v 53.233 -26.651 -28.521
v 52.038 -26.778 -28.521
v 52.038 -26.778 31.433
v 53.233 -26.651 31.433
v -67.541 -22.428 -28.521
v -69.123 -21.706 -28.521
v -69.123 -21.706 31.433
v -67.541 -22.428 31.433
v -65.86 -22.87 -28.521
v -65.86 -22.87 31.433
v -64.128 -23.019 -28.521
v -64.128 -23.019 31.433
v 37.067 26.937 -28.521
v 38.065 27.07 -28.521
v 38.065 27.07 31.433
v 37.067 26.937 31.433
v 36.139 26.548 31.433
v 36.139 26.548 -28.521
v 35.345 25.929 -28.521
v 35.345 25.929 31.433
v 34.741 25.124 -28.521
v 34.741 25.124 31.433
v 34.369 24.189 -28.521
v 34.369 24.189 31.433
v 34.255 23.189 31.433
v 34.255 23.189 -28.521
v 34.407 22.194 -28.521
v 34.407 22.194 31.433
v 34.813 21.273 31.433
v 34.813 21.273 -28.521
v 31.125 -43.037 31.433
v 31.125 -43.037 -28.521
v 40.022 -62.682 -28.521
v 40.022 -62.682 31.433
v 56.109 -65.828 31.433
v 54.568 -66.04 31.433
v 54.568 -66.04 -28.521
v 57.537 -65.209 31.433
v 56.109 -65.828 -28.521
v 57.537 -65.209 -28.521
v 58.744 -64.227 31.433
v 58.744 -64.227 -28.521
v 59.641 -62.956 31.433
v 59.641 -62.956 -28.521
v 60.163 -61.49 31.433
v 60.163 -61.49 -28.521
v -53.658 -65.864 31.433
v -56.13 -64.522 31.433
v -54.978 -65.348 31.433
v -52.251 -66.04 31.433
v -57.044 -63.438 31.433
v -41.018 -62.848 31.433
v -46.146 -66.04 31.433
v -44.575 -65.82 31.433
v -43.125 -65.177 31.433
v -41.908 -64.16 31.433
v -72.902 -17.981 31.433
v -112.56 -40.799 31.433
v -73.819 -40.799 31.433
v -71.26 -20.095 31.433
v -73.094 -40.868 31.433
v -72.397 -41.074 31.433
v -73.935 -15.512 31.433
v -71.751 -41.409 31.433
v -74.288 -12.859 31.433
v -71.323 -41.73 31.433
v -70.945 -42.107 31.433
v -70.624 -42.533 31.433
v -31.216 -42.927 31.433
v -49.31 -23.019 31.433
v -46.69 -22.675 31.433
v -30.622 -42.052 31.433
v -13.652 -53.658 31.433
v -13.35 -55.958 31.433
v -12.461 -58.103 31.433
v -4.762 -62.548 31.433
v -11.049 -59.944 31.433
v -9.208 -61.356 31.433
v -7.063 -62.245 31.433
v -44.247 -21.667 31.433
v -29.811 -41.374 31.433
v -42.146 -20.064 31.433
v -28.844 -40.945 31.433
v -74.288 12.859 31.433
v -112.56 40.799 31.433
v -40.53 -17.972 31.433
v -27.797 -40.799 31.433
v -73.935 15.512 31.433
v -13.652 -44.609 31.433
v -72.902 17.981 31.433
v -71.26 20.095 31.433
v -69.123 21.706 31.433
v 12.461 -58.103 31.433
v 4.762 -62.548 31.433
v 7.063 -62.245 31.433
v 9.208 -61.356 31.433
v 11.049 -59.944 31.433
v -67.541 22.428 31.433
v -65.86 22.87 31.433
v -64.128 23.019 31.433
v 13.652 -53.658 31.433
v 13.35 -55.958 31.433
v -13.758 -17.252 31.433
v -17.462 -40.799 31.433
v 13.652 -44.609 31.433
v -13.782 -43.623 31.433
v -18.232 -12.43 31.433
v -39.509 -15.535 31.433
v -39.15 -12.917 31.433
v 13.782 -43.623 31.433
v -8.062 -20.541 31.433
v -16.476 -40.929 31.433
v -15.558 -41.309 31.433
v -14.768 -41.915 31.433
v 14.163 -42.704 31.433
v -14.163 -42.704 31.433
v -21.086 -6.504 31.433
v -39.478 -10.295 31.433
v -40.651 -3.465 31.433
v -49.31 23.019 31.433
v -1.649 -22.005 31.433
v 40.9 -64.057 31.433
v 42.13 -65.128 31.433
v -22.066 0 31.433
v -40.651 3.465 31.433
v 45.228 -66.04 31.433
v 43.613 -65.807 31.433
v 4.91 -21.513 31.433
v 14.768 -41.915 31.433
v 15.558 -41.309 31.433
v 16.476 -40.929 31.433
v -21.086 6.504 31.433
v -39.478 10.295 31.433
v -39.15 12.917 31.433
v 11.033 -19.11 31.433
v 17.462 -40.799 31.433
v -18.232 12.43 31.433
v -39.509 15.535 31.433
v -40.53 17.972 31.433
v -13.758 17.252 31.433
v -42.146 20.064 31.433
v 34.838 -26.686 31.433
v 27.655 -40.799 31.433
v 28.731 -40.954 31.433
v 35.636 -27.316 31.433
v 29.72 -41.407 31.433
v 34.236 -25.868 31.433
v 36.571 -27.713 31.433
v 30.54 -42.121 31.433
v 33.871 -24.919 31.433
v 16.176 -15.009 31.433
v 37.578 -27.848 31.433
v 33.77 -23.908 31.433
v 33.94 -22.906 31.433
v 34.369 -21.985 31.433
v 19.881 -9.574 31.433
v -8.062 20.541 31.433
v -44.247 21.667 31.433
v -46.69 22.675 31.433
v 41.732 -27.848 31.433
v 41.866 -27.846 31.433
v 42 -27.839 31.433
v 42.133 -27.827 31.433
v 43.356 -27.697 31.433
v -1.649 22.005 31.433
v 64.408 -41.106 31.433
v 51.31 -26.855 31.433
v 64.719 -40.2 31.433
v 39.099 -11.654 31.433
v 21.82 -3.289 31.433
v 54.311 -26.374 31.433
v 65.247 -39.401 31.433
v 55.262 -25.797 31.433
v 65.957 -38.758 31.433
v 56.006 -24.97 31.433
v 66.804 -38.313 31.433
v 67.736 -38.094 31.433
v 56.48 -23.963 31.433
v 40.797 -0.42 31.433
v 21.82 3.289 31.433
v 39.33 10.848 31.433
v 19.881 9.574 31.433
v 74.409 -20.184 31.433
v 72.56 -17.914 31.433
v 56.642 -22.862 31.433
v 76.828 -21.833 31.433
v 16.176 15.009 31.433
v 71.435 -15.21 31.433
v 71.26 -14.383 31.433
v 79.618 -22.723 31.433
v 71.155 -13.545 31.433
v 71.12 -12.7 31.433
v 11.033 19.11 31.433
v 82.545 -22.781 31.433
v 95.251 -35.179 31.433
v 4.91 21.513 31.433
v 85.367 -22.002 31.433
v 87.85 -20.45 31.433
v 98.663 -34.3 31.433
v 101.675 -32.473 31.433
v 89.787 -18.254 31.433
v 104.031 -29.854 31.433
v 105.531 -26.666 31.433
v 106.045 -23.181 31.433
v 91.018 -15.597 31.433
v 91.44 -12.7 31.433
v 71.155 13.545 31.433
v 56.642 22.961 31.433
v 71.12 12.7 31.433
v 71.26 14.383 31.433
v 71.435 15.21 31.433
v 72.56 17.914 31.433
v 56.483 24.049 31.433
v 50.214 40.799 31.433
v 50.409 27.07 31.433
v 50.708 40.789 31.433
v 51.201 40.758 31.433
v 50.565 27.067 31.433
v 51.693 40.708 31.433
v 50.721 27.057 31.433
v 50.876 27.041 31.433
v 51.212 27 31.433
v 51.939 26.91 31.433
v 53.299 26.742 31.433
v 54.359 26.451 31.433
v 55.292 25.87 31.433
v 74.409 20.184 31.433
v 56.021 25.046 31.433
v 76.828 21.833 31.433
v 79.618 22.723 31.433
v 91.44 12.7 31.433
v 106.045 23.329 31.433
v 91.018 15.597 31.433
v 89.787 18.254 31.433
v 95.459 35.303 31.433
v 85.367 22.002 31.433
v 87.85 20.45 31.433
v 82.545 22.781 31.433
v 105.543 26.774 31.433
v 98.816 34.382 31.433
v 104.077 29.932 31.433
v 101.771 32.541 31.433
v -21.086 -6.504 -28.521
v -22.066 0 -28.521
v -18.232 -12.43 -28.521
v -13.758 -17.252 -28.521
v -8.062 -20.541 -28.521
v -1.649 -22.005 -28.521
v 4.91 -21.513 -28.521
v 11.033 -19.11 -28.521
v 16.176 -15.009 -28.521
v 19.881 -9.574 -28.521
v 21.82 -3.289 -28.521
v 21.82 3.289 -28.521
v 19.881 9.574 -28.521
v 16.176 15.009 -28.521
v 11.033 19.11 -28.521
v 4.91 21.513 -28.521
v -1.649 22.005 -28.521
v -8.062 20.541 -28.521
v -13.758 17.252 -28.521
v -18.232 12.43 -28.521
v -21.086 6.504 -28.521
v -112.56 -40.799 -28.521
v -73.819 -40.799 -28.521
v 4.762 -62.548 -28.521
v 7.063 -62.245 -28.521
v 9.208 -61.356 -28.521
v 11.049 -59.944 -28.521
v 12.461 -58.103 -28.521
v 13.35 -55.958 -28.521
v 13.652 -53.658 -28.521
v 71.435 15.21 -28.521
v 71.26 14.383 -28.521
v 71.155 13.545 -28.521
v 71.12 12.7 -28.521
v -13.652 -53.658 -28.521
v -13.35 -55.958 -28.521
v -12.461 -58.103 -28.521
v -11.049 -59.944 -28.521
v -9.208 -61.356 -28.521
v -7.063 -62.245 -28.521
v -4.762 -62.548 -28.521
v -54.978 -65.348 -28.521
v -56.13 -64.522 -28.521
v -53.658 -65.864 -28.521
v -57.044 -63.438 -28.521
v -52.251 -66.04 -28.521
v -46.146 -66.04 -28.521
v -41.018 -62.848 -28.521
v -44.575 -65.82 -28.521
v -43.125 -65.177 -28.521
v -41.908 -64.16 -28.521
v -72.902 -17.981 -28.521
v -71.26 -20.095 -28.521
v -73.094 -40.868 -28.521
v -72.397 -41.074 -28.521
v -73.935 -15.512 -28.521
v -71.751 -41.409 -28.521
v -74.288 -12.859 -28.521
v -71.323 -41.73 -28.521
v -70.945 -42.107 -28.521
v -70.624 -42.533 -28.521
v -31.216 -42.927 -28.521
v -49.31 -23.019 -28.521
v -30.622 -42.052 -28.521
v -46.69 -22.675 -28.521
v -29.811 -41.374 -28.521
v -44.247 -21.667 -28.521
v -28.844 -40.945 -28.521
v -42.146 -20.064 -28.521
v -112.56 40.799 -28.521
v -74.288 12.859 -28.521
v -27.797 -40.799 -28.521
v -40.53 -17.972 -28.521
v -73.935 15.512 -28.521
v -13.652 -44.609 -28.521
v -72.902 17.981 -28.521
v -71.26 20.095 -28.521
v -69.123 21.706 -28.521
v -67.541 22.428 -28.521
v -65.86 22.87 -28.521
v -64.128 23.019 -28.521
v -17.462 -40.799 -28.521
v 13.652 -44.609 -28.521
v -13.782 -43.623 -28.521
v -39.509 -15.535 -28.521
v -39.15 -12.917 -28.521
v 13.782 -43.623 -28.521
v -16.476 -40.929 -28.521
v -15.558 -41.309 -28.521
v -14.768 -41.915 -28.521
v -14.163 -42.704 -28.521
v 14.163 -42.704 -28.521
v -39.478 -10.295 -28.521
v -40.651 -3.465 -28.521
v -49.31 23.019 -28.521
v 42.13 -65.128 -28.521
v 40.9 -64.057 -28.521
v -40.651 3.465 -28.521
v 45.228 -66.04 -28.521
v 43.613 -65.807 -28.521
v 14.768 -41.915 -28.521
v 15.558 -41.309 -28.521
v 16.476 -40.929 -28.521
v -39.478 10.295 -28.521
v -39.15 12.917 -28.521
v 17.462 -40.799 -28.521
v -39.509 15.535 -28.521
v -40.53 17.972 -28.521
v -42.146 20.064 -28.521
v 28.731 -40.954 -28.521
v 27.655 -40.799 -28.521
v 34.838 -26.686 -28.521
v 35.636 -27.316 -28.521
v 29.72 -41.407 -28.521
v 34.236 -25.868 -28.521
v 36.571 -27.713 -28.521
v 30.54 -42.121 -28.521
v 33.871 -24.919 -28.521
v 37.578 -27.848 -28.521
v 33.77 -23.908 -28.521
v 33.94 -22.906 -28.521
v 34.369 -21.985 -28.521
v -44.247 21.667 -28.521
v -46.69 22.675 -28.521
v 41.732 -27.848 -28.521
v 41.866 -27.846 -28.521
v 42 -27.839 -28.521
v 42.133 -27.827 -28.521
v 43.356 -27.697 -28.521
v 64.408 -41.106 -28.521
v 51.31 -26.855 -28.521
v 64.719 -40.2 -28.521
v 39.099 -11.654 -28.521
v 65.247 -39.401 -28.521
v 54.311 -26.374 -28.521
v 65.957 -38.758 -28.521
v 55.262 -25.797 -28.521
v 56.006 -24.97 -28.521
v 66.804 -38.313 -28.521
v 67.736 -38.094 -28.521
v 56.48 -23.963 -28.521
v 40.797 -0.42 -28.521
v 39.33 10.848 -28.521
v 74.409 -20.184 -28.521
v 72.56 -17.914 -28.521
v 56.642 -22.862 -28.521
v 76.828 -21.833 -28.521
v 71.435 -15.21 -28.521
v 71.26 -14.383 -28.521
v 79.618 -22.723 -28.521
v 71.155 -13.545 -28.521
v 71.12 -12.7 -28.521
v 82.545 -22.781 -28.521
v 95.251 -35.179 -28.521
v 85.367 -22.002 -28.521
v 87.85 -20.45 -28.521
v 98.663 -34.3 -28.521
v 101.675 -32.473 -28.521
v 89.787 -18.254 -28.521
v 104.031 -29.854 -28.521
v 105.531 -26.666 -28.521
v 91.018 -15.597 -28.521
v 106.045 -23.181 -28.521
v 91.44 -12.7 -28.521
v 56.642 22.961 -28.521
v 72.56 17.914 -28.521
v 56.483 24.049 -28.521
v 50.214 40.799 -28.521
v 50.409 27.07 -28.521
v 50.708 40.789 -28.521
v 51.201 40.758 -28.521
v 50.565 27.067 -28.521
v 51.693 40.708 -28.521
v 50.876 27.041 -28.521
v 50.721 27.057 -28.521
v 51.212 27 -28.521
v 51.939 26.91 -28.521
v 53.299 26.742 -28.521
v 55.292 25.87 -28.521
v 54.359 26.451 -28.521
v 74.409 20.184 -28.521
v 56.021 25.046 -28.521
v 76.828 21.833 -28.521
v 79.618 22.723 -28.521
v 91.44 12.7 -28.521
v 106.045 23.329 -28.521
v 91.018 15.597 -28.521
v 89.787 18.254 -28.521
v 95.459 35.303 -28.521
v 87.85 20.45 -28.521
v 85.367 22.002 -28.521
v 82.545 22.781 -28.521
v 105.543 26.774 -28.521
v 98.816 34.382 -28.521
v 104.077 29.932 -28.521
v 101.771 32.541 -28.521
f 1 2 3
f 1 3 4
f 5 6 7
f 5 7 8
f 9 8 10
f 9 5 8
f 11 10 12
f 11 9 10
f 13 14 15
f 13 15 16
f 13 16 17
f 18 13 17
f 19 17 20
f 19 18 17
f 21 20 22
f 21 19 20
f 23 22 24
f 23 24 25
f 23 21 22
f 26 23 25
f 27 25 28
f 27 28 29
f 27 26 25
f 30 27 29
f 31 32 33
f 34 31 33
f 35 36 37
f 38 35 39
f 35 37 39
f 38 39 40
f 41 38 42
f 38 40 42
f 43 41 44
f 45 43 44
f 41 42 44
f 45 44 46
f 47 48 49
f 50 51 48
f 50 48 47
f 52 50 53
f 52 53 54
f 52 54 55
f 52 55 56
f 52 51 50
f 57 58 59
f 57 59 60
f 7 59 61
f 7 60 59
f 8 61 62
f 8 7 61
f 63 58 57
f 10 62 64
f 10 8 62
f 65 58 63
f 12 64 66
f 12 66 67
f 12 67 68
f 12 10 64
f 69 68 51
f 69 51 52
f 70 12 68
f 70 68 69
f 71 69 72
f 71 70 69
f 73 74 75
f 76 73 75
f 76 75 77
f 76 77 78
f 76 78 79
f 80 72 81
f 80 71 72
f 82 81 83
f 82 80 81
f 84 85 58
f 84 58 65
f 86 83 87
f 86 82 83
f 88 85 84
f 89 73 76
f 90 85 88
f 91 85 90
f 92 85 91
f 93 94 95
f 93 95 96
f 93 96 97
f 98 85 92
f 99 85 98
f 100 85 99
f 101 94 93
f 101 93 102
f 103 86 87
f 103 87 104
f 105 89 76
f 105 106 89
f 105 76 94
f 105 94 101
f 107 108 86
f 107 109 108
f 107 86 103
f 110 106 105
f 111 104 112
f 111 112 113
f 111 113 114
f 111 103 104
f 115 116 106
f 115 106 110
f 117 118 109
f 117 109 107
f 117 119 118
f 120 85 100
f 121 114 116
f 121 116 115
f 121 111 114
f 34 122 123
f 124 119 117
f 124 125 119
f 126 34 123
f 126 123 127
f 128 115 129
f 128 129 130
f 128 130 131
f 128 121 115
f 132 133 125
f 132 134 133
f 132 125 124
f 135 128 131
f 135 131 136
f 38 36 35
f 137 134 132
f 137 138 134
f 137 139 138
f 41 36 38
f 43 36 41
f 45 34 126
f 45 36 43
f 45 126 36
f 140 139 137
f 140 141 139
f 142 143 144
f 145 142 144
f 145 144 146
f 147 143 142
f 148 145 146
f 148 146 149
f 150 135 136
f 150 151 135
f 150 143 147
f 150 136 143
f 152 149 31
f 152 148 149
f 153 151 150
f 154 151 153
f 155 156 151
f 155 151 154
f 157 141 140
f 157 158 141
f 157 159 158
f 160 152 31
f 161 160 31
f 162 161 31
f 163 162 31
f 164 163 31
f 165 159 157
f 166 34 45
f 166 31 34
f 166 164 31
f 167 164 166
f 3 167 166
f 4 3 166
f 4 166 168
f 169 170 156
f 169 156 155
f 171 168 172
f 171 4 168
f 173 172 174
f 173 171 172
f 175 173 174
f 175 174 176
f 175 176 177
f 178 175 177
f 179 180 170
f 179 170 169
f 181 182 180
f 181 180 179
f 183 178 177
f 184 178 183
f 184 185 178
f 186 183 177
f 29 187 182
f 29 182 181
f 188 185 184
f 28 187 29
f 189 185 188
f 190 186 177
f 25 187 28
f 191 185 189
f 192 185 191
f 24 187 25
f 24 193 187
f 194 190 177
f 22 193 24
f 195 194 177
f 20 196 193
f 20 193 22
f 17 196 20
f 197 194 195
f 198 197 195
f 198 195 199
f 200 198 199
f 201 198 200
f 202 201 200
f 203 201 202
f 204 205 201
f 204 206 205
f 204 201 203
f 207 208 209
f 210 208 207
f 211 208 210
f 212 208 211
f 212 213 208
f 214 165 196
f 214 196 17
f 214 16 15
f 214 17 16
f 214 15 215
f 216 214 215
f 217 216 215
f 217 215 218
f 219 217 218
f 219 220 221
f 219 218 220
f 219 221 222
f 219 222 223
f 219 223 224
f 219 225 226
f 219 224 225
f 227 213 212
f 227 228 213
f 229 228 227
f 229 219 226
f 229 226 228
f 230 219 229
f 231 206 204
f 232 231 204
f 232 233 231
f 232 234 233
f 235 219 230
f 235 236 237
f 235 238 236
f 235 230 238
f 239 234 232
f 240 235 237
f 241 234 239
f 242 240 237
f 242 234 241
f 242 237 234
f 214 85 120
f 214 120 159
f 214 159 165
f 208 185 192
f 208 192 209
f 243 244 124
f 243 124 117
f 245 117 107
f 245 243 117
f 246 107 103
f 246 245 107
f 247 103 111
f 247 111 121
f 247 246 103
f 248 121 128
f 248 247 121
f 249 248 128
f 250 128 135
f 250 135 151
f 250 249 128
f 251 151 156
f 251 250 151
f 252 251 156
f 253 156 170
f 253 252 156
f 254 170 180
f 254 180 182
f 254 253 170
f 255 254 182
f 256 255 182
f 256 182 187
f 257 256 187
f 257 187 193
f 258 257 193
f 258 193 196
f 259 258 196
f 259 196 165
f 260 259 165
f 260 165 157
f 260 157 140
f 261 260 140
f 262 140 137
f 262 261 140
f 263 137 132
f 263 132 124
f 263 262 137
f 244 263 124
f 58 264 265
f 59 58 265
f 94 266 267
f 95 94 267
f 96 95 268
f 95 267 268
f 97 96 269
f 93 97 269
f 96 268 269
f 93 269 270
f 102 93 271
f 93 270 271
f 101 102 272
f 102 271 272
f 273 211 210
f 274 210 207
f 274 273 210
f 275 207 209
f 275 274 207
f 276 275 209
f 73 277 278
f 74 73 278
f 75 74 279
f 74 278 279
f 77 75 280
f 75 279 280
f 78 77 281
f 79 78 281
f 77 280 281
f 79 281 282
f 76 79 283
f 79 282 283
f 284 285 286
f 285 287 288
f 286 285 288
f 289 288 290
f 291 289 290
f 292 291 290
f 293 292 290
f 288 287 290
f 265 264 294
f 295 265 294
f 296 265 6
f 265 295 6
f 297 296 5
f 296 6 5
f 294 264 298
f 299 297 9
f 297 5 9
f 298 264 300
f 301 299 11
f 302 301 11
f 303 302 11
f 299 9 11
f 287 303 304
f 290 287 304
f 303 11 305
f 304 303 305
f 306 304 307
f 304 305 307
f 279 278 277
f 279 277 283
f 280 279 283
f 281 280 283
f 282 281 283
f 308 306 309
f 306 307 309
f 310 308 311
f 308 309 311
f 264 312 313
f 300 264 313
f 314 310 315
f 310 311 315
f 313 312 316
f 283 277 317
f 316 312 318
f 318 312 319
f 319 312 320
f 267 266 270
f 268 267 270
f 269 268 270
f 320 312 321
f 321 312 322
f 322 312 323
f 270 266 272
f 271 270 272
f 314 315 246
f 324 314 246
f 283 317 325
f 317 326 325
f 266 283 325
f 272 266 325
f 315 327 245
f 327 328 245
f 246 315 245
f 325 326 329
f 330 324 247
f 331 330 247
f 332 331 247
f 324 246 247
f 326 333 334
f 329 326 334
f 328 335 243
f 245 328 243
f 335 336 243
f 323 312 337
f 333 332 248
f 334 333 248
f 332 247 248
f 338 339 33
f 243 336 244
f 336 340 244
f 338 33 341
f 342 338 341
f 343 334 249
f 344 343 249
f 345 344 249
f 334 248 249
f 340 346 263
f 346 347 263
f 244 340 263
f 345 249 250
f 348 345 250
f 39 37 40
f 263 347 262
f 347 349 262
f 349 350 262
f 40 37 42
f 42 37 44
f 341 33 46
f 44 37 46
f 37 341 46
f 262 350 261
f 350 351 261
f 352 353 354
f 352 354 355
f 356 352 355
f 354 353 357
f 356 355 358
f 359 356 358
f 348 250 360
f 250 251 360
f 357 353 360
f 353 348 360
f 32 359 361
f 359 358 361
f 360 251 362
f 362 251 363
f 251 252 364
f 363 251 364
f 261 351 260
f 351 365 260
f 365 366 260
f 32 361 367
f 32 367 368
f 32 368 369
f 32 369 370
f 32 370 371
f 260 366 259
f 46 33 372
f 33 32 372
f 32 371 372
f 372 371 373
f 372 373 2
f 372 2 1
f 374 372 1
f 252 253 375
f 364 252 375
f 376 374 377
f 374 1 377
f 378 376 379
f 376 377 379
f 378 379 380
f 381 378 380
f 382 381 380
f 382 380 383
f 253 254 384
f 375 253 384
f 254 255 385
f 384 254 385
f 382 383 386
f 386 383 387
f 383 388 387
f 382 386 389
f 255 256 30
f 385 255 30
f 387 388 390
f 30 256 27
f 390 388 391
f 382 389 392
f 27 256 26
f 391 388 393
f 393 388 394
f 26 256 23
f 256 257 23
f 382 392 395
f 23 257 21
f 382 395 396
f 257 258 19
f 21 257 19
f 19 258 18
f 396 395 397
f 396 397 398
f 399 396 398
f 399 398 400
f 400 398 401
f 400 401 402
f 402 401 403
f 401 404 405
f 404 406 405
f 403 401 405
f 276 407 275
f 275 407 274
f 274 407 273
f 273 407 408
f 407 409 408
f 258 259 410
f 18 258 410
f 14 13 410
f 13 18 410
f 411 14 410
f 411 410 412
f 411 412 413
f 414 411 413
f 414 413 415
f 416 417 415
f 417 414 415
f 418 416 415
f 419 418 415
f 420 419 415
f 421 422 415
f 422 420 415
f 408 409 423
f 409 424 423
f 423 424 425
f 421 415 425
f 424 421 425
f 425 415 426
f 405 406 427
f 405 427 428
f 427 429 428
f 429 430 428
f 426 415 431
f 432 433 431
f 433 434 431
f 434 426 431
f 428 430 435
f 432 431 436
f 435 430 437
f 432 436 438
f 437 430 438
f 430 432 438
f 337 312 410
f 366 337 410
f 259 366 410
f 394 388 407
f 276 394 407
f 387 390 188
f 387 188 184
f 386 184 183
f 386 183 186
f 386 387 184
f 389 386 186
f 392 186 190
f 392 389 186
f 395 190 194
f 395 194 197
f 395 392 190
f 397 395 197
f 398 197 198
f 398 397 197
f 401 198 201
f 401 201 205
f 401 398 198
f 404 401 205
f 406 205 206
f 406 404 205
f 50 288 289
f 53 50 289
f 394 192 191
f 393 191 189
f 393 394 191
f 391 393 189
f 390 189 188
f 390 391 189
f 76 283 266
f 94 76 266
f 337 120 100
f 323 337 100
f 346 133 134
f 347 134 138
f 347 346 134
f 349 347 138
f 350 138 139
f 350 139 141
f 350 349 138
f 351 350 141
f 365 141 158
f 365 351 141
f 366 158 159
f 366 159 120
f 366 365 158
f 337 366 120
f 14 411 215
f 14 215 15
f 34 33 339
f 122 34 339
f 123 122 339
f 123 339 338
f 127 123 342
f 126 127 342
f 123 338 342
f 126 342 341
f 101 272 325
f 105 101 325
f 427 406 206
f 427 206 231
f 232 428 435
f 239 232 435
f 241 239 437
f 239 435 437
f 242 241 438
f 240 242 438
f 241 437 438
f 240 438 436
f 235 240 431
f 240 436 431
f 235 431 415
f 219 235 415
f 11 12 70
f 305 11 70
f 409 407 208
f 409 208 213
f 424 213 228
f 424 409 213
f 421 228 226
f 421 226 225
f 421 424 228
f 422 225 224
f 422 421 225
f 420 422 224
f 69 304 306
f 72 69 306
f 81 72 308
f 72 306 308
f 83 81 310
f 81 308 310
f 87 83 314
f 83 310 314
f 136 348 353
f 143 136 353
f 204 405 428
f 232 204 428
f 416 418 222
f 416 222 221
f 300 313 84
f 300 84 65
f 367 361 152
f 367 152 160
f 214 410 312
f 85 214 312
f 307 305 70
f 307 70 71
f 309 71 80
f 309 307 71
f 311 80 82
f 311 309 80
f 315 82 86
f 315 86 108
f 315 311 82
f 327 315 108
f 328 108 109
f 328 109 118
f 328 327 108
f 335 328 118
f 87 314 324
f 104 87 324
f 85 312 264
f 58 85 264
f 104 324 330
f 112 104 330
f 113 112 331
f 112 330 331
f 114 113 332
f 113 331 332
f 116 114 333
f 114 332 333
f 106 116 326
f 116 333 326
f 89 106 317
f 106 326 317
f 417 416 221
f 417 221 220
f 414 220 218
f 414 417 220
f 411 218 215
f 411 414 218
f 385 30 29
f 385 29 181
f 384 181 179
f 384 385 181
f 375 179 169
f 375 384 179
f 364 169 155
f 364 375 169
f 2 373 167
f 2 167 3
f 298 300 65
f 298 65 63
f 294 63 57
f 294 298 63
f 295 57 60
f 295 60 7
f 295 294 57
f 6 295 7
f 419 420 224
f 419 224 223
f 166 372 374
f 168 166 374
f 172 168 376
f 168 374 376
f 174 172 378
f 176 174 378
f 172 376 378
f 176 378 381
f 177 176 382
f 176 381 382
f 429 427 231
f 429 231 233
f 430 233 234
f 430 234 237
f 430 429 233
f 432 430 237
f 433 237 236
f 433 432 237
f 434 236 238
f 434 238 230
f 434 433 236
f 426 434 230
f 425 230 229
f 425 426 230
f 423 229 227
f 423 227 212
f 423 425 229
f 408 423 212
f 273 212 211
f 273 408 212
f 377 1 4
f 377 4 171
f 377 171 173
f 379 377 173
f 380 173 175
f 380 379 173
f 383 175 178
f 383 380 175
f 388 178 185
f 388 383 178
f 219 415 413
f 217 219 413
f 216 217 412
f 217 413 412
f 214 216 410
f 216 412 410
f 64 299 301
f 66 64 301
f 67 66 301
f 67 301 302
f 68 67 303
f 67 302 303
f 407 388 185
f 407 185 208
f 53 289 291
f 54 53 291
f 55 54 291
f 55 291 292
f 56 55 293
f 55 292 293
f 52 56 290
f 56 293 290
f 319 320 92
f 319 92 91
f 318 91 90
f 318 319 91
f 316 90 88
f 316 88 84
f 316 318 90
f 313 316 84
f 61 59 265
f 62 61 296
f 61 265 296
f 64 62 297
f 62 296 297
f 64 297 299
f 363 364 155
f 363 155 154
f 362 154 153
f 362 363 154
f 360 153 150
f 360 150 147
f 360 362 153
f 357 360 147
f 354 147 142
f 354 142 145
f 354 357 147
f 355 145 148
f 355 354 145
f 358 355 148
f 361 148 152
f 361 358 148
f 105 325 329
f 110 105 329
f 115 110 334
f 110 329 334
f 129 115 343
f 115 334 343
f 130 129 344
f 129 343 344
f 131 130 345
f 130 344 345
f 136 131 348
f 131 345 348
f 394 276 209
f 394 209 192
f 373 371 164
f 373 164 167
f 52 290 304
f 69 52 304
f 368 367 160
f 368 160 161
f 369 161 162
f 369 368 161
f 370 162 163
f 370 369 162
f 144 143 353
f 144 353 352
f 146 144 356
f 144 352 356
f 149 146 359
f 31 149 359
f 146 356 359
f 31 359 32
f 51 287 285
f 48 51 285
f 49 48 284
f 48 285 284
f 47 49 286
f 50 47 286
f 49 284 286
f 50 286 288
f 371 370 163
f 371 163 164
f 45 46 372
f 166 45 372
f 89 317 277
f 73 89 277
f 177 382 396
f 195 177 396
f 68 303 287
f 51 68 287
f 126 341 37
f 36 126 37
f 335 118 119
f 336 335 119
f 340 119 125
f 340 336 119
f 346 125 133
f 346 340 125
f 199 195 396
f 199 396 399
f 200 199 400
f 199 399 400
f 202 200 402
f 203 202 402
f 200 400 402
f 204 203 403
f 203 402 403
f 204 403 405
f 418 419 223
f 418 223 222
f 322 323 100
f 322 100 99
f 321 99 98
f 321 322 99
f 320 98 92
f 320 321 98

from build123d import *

# Parameters (mm, degrees)
BOSS_EXTRUDE1_DEPTH      = 31.4325
BOSS_EXTRUDE1_DEPTH_BACK = 28.521152
SKETCH1_R                = 22.06625


with BuildPart() as part:
    # Sketch1 → Boss-Extrude1 (new, two sides: drawn at the far end of the back side and taken through both)
    with BuildSketch(Plane.XY.offset(-BOSS_EXTRUDE1_DEPTH_BACK)):
        with BuildLine():
            Line((-112.5601, 40.79875), (-112.5601, -40.79875))
            Line((-112.5601, -40.79875), (-105.64544448, -40.79875))
            Line((-105.64544448, -40.79875), (-78.272997716, -40.79875))
            Line((-78.272997716, -40.79875), (-73.818843223, -40.79875))
            ThreePointArc((-73.818843223, -40.79875), (-72.740595899, -40.954508258), (-71.750509166, -41.40904779))
            ThreePointArc((-71.750509166, -41.40904779), (-71.12778643, -41.911656502), (-70.623783626, -42.533251464))
            Line((-70.623783626, -42.533251464), (-57.043977681, -63.438247804))
            ThreePointArc((-57.043977681, -63.438247804), (-54.978017505, -65.347620641), (-52.251388286, -66.04))
            Line((-52.251388286, -66.04), (-46.145505176, -66.04))
            ThreePointArc((-46.145505176, -66.04), (-43.125397449, -65.176821752), (-41.017587638, -62.848031257))
            Line((-41.017587638, -62.848031257), (-31.215934729, -42.926729162))
            ThreePointArc((-31.215934729, -42.926729162), (-29.810728189, -41.374202165), (-27.797323037, -40.79875))
            Line((-27.797323037, -40.79875), (-17.4625, -40.79875))
            ThreePointArc((-17.4625, -40.79875), (-14.768423164, -41.914673164), (-13.6525, -44.60875))
            Line((-13.6525, -44.60875), (-13.6525, -53.6575))
            ThreePointArc((-13.6525, -53.6575), (-11.048679285, -59.943679285), (-4.7625, -62.5475))
            Line((-4.7625, -62.5475), (4.7625, -62.5475))
            ThreePointArc((4.7625, -62.5475), (11.048679285, -59.943679285), (13.6525, -53.6575))
            Line((13.6525, -53.6575), (13.6525, -44.60875))
            ThreePointArc((13.6525, -44.60875), (14.768423164, -41.914673164), (17.4625, -40.79875))
            Line((17.4625, -40.79875), (27.654758859, -40.79875))
            ThreePointArc((27.654758859, -40.79875), (29.719716377, -41.406867671), (31.125494286, -43.037096222))
            Line((31.125494286, -43.037096222), (40.021517431, -62.682480667))
            ThreePointArc((40.021517431, -62.682480667), (42.130184293, -65.127823493), (45.227620571, -66.04))
            Line((45.227620571, -66.04), (54.568047284, -66.04))
            ThreePointArc((54.568047284, -66.04), (58.173789295, -64.758942889), (60.163026865, -61.49008733))
            Line((60.163026865, -61.49008733), (64.407842813, -41.105642371))
            ThreePointArc((64.407842813, -41.105642371), (65.581423361, -39.0573205), (67.73644034, -38.093569694))
            Line((67.73644034, -38.093569694), (95.251064725, -35.178643905))
            ThreePointArc((95.251064725, -35.178643905), (102.949381832, -31.250135269), (106.045, -23.180784951))
            Line((106.045, -23.180784951), (106.045, 23.328923197))
            ThreePointArc((106.045, 23.328923197), (103.018943576, 31.320276275), (95.45872167, 35.302962082))
            Line((95.45872167, 35.302962082), (51.692807067, 40.707788885))
            ThreePointArc((51.692807067, 40.707788885), (50.954843743, 40.77598825), (50.214085398, 40.79875))
            Line((50.214085398, 40.79875), (-70.371619795, 40.79875))
            Line((-70.371619795, 40.79875), (-78.272997716, 40.79875))
            Line((-78.272997716, 40.79875), (-105.64544448, 40.79875))
            Line((-105.64544448, 40.79875), (-112.5601, 40.79875))
        make_face()
        with Locations(Location((0, 0, 0), (0, 0, 180))):
            Circle(SKETCH1_R, mode=Mode.SUBTRACT)
        with BuildLine():
            Line((51.310190607, -26.854733006), (52.037693166, -26.777660684))
            Line((52.037693166, -26.777660684), (53.233388861, -26.650987532))
            ThreePointArc((53.233388861, -26.650987532), (55.664436368, -25.410405857), (56.642, -22.862189968))
            Line((56.642, -22.862189968), (56.642, 22.960948798))
            ThreePointArc((56.642, 22.960948798), (55.686403235, 25.484533981), (53.298964738, 26.742224235))
            Line((53.298964738, 26.742224235), (51.93932935, 26.910131015))
            Line((51.93932935, 26.910131015), (51.211826791, 26.999973199))
            Line((51.211826791, 26.999973199), (50.876355003, 27.041401943))
            ThreePointArc((50.876355003, 27.041401943), (50.643313953, 27.062938585), (50.409390265, 27.070126506))
            Line((50.409390265, 27.070126506), (43.95784943, 27.070126506))
            Line((43.95784943, 27.070126506), (38.064512232, 27.070126506))
            ThreePointArc((38.064512232, 27.070126506), (34.741474437, 25.123864634), (34.813450689, 21.273496484))
            ThreePointArc((34.813450689, 21.273496484), (40.796592197, -0.419602974), (34.368525909, -21.985050111))
            ThreePointArc((34.368525909, -21.985050111), (34.236008022, -25.867591825), (37.578038056, -27.848128721))
            Line((37.578038056, -27.848128721), (41.732055975, -27.848128721))
            ThreePointArc((41.732055975, -27.848128721), (41.933030203, -27.84282442), (42.133444836, -27.826926285))
            Line((42.133444836, -27.826926285), (43.35576614, -27.69743239))
            Line((43.35576614, -27.69743239), (51.310190607, -26.854733006))
        make_face(mode=Mode.SUBTRACT)
        with BuildLine():
            Line((-49.309702392, 23.01875), (-64.127923903, 23.01875))
            ThreePointArc((-64.127923903, 23.01875), (-66.710199181, 22.685115268), (-69.122880616, 21.706122911))
            ThreePointArc((-69.122880616, 21.706122911), (-72.902157779, 17.981095156), (-74.287923903, 12.85875))
            Line((-74.287923903, 12.85875), (-74.287923903, -12.85875))
            ThreePointArc((-74.287923903, -12.85875), (-72.902157779, -17.981095156), (-69.122880616, -21.706122911))
            ThreePointArc((-69.122880616, -21.706122911), (-66.710199181, -22.685115268), (-64.127923903, -23.01875))
            Line((-64.127923903, -23.01875), (-49.309702392, -23.01875))
            ThreePointArc((-49.309702392, -23.01875), (-41.270013925, -19.07075526), (-39.47848447, -10.295011682))
            ThreePointArc((-39.47848447, -10.295011682), (-40.79875, 0), (-39.47848447, 10.295011682))
            ThreePointArc((-39.47848447, 10.295011682), (-41.270013925, 19.07075526), (-49.309702392, 23.01875))
        make_face(mode=Mode.SUBTRACT)
        with BuildLine():
            Line((71.12, 12.7), (71.12, -12.7))
            ThreePointArc((71.12, -12.7), (71.199051629, -13.96494266), (71.434976365, -15.210201111))
            ThreePointArc((71.434976365, -15.210201111), (82.54494266, -22.780948371), (91.44, -12.7))
            Line((91.44, -12.7), (91.44, 12.7))
            ThreePointArc((91.44, 12.7), (82.54494266, 22.780948371), (71.434976365, 15.210201111))
            ThreePointArc((71.434976365, 15.210201111), (71.199051629, 13.96494266), (71.12, 12.7))
        make_face(mode=Mode.SUBTRACT)
    extrude(amount=BOSS_EXTRUDE1_DEPTH + BOSS_EXTRUDE1_DEPTH_BACK)


solid = part.part
